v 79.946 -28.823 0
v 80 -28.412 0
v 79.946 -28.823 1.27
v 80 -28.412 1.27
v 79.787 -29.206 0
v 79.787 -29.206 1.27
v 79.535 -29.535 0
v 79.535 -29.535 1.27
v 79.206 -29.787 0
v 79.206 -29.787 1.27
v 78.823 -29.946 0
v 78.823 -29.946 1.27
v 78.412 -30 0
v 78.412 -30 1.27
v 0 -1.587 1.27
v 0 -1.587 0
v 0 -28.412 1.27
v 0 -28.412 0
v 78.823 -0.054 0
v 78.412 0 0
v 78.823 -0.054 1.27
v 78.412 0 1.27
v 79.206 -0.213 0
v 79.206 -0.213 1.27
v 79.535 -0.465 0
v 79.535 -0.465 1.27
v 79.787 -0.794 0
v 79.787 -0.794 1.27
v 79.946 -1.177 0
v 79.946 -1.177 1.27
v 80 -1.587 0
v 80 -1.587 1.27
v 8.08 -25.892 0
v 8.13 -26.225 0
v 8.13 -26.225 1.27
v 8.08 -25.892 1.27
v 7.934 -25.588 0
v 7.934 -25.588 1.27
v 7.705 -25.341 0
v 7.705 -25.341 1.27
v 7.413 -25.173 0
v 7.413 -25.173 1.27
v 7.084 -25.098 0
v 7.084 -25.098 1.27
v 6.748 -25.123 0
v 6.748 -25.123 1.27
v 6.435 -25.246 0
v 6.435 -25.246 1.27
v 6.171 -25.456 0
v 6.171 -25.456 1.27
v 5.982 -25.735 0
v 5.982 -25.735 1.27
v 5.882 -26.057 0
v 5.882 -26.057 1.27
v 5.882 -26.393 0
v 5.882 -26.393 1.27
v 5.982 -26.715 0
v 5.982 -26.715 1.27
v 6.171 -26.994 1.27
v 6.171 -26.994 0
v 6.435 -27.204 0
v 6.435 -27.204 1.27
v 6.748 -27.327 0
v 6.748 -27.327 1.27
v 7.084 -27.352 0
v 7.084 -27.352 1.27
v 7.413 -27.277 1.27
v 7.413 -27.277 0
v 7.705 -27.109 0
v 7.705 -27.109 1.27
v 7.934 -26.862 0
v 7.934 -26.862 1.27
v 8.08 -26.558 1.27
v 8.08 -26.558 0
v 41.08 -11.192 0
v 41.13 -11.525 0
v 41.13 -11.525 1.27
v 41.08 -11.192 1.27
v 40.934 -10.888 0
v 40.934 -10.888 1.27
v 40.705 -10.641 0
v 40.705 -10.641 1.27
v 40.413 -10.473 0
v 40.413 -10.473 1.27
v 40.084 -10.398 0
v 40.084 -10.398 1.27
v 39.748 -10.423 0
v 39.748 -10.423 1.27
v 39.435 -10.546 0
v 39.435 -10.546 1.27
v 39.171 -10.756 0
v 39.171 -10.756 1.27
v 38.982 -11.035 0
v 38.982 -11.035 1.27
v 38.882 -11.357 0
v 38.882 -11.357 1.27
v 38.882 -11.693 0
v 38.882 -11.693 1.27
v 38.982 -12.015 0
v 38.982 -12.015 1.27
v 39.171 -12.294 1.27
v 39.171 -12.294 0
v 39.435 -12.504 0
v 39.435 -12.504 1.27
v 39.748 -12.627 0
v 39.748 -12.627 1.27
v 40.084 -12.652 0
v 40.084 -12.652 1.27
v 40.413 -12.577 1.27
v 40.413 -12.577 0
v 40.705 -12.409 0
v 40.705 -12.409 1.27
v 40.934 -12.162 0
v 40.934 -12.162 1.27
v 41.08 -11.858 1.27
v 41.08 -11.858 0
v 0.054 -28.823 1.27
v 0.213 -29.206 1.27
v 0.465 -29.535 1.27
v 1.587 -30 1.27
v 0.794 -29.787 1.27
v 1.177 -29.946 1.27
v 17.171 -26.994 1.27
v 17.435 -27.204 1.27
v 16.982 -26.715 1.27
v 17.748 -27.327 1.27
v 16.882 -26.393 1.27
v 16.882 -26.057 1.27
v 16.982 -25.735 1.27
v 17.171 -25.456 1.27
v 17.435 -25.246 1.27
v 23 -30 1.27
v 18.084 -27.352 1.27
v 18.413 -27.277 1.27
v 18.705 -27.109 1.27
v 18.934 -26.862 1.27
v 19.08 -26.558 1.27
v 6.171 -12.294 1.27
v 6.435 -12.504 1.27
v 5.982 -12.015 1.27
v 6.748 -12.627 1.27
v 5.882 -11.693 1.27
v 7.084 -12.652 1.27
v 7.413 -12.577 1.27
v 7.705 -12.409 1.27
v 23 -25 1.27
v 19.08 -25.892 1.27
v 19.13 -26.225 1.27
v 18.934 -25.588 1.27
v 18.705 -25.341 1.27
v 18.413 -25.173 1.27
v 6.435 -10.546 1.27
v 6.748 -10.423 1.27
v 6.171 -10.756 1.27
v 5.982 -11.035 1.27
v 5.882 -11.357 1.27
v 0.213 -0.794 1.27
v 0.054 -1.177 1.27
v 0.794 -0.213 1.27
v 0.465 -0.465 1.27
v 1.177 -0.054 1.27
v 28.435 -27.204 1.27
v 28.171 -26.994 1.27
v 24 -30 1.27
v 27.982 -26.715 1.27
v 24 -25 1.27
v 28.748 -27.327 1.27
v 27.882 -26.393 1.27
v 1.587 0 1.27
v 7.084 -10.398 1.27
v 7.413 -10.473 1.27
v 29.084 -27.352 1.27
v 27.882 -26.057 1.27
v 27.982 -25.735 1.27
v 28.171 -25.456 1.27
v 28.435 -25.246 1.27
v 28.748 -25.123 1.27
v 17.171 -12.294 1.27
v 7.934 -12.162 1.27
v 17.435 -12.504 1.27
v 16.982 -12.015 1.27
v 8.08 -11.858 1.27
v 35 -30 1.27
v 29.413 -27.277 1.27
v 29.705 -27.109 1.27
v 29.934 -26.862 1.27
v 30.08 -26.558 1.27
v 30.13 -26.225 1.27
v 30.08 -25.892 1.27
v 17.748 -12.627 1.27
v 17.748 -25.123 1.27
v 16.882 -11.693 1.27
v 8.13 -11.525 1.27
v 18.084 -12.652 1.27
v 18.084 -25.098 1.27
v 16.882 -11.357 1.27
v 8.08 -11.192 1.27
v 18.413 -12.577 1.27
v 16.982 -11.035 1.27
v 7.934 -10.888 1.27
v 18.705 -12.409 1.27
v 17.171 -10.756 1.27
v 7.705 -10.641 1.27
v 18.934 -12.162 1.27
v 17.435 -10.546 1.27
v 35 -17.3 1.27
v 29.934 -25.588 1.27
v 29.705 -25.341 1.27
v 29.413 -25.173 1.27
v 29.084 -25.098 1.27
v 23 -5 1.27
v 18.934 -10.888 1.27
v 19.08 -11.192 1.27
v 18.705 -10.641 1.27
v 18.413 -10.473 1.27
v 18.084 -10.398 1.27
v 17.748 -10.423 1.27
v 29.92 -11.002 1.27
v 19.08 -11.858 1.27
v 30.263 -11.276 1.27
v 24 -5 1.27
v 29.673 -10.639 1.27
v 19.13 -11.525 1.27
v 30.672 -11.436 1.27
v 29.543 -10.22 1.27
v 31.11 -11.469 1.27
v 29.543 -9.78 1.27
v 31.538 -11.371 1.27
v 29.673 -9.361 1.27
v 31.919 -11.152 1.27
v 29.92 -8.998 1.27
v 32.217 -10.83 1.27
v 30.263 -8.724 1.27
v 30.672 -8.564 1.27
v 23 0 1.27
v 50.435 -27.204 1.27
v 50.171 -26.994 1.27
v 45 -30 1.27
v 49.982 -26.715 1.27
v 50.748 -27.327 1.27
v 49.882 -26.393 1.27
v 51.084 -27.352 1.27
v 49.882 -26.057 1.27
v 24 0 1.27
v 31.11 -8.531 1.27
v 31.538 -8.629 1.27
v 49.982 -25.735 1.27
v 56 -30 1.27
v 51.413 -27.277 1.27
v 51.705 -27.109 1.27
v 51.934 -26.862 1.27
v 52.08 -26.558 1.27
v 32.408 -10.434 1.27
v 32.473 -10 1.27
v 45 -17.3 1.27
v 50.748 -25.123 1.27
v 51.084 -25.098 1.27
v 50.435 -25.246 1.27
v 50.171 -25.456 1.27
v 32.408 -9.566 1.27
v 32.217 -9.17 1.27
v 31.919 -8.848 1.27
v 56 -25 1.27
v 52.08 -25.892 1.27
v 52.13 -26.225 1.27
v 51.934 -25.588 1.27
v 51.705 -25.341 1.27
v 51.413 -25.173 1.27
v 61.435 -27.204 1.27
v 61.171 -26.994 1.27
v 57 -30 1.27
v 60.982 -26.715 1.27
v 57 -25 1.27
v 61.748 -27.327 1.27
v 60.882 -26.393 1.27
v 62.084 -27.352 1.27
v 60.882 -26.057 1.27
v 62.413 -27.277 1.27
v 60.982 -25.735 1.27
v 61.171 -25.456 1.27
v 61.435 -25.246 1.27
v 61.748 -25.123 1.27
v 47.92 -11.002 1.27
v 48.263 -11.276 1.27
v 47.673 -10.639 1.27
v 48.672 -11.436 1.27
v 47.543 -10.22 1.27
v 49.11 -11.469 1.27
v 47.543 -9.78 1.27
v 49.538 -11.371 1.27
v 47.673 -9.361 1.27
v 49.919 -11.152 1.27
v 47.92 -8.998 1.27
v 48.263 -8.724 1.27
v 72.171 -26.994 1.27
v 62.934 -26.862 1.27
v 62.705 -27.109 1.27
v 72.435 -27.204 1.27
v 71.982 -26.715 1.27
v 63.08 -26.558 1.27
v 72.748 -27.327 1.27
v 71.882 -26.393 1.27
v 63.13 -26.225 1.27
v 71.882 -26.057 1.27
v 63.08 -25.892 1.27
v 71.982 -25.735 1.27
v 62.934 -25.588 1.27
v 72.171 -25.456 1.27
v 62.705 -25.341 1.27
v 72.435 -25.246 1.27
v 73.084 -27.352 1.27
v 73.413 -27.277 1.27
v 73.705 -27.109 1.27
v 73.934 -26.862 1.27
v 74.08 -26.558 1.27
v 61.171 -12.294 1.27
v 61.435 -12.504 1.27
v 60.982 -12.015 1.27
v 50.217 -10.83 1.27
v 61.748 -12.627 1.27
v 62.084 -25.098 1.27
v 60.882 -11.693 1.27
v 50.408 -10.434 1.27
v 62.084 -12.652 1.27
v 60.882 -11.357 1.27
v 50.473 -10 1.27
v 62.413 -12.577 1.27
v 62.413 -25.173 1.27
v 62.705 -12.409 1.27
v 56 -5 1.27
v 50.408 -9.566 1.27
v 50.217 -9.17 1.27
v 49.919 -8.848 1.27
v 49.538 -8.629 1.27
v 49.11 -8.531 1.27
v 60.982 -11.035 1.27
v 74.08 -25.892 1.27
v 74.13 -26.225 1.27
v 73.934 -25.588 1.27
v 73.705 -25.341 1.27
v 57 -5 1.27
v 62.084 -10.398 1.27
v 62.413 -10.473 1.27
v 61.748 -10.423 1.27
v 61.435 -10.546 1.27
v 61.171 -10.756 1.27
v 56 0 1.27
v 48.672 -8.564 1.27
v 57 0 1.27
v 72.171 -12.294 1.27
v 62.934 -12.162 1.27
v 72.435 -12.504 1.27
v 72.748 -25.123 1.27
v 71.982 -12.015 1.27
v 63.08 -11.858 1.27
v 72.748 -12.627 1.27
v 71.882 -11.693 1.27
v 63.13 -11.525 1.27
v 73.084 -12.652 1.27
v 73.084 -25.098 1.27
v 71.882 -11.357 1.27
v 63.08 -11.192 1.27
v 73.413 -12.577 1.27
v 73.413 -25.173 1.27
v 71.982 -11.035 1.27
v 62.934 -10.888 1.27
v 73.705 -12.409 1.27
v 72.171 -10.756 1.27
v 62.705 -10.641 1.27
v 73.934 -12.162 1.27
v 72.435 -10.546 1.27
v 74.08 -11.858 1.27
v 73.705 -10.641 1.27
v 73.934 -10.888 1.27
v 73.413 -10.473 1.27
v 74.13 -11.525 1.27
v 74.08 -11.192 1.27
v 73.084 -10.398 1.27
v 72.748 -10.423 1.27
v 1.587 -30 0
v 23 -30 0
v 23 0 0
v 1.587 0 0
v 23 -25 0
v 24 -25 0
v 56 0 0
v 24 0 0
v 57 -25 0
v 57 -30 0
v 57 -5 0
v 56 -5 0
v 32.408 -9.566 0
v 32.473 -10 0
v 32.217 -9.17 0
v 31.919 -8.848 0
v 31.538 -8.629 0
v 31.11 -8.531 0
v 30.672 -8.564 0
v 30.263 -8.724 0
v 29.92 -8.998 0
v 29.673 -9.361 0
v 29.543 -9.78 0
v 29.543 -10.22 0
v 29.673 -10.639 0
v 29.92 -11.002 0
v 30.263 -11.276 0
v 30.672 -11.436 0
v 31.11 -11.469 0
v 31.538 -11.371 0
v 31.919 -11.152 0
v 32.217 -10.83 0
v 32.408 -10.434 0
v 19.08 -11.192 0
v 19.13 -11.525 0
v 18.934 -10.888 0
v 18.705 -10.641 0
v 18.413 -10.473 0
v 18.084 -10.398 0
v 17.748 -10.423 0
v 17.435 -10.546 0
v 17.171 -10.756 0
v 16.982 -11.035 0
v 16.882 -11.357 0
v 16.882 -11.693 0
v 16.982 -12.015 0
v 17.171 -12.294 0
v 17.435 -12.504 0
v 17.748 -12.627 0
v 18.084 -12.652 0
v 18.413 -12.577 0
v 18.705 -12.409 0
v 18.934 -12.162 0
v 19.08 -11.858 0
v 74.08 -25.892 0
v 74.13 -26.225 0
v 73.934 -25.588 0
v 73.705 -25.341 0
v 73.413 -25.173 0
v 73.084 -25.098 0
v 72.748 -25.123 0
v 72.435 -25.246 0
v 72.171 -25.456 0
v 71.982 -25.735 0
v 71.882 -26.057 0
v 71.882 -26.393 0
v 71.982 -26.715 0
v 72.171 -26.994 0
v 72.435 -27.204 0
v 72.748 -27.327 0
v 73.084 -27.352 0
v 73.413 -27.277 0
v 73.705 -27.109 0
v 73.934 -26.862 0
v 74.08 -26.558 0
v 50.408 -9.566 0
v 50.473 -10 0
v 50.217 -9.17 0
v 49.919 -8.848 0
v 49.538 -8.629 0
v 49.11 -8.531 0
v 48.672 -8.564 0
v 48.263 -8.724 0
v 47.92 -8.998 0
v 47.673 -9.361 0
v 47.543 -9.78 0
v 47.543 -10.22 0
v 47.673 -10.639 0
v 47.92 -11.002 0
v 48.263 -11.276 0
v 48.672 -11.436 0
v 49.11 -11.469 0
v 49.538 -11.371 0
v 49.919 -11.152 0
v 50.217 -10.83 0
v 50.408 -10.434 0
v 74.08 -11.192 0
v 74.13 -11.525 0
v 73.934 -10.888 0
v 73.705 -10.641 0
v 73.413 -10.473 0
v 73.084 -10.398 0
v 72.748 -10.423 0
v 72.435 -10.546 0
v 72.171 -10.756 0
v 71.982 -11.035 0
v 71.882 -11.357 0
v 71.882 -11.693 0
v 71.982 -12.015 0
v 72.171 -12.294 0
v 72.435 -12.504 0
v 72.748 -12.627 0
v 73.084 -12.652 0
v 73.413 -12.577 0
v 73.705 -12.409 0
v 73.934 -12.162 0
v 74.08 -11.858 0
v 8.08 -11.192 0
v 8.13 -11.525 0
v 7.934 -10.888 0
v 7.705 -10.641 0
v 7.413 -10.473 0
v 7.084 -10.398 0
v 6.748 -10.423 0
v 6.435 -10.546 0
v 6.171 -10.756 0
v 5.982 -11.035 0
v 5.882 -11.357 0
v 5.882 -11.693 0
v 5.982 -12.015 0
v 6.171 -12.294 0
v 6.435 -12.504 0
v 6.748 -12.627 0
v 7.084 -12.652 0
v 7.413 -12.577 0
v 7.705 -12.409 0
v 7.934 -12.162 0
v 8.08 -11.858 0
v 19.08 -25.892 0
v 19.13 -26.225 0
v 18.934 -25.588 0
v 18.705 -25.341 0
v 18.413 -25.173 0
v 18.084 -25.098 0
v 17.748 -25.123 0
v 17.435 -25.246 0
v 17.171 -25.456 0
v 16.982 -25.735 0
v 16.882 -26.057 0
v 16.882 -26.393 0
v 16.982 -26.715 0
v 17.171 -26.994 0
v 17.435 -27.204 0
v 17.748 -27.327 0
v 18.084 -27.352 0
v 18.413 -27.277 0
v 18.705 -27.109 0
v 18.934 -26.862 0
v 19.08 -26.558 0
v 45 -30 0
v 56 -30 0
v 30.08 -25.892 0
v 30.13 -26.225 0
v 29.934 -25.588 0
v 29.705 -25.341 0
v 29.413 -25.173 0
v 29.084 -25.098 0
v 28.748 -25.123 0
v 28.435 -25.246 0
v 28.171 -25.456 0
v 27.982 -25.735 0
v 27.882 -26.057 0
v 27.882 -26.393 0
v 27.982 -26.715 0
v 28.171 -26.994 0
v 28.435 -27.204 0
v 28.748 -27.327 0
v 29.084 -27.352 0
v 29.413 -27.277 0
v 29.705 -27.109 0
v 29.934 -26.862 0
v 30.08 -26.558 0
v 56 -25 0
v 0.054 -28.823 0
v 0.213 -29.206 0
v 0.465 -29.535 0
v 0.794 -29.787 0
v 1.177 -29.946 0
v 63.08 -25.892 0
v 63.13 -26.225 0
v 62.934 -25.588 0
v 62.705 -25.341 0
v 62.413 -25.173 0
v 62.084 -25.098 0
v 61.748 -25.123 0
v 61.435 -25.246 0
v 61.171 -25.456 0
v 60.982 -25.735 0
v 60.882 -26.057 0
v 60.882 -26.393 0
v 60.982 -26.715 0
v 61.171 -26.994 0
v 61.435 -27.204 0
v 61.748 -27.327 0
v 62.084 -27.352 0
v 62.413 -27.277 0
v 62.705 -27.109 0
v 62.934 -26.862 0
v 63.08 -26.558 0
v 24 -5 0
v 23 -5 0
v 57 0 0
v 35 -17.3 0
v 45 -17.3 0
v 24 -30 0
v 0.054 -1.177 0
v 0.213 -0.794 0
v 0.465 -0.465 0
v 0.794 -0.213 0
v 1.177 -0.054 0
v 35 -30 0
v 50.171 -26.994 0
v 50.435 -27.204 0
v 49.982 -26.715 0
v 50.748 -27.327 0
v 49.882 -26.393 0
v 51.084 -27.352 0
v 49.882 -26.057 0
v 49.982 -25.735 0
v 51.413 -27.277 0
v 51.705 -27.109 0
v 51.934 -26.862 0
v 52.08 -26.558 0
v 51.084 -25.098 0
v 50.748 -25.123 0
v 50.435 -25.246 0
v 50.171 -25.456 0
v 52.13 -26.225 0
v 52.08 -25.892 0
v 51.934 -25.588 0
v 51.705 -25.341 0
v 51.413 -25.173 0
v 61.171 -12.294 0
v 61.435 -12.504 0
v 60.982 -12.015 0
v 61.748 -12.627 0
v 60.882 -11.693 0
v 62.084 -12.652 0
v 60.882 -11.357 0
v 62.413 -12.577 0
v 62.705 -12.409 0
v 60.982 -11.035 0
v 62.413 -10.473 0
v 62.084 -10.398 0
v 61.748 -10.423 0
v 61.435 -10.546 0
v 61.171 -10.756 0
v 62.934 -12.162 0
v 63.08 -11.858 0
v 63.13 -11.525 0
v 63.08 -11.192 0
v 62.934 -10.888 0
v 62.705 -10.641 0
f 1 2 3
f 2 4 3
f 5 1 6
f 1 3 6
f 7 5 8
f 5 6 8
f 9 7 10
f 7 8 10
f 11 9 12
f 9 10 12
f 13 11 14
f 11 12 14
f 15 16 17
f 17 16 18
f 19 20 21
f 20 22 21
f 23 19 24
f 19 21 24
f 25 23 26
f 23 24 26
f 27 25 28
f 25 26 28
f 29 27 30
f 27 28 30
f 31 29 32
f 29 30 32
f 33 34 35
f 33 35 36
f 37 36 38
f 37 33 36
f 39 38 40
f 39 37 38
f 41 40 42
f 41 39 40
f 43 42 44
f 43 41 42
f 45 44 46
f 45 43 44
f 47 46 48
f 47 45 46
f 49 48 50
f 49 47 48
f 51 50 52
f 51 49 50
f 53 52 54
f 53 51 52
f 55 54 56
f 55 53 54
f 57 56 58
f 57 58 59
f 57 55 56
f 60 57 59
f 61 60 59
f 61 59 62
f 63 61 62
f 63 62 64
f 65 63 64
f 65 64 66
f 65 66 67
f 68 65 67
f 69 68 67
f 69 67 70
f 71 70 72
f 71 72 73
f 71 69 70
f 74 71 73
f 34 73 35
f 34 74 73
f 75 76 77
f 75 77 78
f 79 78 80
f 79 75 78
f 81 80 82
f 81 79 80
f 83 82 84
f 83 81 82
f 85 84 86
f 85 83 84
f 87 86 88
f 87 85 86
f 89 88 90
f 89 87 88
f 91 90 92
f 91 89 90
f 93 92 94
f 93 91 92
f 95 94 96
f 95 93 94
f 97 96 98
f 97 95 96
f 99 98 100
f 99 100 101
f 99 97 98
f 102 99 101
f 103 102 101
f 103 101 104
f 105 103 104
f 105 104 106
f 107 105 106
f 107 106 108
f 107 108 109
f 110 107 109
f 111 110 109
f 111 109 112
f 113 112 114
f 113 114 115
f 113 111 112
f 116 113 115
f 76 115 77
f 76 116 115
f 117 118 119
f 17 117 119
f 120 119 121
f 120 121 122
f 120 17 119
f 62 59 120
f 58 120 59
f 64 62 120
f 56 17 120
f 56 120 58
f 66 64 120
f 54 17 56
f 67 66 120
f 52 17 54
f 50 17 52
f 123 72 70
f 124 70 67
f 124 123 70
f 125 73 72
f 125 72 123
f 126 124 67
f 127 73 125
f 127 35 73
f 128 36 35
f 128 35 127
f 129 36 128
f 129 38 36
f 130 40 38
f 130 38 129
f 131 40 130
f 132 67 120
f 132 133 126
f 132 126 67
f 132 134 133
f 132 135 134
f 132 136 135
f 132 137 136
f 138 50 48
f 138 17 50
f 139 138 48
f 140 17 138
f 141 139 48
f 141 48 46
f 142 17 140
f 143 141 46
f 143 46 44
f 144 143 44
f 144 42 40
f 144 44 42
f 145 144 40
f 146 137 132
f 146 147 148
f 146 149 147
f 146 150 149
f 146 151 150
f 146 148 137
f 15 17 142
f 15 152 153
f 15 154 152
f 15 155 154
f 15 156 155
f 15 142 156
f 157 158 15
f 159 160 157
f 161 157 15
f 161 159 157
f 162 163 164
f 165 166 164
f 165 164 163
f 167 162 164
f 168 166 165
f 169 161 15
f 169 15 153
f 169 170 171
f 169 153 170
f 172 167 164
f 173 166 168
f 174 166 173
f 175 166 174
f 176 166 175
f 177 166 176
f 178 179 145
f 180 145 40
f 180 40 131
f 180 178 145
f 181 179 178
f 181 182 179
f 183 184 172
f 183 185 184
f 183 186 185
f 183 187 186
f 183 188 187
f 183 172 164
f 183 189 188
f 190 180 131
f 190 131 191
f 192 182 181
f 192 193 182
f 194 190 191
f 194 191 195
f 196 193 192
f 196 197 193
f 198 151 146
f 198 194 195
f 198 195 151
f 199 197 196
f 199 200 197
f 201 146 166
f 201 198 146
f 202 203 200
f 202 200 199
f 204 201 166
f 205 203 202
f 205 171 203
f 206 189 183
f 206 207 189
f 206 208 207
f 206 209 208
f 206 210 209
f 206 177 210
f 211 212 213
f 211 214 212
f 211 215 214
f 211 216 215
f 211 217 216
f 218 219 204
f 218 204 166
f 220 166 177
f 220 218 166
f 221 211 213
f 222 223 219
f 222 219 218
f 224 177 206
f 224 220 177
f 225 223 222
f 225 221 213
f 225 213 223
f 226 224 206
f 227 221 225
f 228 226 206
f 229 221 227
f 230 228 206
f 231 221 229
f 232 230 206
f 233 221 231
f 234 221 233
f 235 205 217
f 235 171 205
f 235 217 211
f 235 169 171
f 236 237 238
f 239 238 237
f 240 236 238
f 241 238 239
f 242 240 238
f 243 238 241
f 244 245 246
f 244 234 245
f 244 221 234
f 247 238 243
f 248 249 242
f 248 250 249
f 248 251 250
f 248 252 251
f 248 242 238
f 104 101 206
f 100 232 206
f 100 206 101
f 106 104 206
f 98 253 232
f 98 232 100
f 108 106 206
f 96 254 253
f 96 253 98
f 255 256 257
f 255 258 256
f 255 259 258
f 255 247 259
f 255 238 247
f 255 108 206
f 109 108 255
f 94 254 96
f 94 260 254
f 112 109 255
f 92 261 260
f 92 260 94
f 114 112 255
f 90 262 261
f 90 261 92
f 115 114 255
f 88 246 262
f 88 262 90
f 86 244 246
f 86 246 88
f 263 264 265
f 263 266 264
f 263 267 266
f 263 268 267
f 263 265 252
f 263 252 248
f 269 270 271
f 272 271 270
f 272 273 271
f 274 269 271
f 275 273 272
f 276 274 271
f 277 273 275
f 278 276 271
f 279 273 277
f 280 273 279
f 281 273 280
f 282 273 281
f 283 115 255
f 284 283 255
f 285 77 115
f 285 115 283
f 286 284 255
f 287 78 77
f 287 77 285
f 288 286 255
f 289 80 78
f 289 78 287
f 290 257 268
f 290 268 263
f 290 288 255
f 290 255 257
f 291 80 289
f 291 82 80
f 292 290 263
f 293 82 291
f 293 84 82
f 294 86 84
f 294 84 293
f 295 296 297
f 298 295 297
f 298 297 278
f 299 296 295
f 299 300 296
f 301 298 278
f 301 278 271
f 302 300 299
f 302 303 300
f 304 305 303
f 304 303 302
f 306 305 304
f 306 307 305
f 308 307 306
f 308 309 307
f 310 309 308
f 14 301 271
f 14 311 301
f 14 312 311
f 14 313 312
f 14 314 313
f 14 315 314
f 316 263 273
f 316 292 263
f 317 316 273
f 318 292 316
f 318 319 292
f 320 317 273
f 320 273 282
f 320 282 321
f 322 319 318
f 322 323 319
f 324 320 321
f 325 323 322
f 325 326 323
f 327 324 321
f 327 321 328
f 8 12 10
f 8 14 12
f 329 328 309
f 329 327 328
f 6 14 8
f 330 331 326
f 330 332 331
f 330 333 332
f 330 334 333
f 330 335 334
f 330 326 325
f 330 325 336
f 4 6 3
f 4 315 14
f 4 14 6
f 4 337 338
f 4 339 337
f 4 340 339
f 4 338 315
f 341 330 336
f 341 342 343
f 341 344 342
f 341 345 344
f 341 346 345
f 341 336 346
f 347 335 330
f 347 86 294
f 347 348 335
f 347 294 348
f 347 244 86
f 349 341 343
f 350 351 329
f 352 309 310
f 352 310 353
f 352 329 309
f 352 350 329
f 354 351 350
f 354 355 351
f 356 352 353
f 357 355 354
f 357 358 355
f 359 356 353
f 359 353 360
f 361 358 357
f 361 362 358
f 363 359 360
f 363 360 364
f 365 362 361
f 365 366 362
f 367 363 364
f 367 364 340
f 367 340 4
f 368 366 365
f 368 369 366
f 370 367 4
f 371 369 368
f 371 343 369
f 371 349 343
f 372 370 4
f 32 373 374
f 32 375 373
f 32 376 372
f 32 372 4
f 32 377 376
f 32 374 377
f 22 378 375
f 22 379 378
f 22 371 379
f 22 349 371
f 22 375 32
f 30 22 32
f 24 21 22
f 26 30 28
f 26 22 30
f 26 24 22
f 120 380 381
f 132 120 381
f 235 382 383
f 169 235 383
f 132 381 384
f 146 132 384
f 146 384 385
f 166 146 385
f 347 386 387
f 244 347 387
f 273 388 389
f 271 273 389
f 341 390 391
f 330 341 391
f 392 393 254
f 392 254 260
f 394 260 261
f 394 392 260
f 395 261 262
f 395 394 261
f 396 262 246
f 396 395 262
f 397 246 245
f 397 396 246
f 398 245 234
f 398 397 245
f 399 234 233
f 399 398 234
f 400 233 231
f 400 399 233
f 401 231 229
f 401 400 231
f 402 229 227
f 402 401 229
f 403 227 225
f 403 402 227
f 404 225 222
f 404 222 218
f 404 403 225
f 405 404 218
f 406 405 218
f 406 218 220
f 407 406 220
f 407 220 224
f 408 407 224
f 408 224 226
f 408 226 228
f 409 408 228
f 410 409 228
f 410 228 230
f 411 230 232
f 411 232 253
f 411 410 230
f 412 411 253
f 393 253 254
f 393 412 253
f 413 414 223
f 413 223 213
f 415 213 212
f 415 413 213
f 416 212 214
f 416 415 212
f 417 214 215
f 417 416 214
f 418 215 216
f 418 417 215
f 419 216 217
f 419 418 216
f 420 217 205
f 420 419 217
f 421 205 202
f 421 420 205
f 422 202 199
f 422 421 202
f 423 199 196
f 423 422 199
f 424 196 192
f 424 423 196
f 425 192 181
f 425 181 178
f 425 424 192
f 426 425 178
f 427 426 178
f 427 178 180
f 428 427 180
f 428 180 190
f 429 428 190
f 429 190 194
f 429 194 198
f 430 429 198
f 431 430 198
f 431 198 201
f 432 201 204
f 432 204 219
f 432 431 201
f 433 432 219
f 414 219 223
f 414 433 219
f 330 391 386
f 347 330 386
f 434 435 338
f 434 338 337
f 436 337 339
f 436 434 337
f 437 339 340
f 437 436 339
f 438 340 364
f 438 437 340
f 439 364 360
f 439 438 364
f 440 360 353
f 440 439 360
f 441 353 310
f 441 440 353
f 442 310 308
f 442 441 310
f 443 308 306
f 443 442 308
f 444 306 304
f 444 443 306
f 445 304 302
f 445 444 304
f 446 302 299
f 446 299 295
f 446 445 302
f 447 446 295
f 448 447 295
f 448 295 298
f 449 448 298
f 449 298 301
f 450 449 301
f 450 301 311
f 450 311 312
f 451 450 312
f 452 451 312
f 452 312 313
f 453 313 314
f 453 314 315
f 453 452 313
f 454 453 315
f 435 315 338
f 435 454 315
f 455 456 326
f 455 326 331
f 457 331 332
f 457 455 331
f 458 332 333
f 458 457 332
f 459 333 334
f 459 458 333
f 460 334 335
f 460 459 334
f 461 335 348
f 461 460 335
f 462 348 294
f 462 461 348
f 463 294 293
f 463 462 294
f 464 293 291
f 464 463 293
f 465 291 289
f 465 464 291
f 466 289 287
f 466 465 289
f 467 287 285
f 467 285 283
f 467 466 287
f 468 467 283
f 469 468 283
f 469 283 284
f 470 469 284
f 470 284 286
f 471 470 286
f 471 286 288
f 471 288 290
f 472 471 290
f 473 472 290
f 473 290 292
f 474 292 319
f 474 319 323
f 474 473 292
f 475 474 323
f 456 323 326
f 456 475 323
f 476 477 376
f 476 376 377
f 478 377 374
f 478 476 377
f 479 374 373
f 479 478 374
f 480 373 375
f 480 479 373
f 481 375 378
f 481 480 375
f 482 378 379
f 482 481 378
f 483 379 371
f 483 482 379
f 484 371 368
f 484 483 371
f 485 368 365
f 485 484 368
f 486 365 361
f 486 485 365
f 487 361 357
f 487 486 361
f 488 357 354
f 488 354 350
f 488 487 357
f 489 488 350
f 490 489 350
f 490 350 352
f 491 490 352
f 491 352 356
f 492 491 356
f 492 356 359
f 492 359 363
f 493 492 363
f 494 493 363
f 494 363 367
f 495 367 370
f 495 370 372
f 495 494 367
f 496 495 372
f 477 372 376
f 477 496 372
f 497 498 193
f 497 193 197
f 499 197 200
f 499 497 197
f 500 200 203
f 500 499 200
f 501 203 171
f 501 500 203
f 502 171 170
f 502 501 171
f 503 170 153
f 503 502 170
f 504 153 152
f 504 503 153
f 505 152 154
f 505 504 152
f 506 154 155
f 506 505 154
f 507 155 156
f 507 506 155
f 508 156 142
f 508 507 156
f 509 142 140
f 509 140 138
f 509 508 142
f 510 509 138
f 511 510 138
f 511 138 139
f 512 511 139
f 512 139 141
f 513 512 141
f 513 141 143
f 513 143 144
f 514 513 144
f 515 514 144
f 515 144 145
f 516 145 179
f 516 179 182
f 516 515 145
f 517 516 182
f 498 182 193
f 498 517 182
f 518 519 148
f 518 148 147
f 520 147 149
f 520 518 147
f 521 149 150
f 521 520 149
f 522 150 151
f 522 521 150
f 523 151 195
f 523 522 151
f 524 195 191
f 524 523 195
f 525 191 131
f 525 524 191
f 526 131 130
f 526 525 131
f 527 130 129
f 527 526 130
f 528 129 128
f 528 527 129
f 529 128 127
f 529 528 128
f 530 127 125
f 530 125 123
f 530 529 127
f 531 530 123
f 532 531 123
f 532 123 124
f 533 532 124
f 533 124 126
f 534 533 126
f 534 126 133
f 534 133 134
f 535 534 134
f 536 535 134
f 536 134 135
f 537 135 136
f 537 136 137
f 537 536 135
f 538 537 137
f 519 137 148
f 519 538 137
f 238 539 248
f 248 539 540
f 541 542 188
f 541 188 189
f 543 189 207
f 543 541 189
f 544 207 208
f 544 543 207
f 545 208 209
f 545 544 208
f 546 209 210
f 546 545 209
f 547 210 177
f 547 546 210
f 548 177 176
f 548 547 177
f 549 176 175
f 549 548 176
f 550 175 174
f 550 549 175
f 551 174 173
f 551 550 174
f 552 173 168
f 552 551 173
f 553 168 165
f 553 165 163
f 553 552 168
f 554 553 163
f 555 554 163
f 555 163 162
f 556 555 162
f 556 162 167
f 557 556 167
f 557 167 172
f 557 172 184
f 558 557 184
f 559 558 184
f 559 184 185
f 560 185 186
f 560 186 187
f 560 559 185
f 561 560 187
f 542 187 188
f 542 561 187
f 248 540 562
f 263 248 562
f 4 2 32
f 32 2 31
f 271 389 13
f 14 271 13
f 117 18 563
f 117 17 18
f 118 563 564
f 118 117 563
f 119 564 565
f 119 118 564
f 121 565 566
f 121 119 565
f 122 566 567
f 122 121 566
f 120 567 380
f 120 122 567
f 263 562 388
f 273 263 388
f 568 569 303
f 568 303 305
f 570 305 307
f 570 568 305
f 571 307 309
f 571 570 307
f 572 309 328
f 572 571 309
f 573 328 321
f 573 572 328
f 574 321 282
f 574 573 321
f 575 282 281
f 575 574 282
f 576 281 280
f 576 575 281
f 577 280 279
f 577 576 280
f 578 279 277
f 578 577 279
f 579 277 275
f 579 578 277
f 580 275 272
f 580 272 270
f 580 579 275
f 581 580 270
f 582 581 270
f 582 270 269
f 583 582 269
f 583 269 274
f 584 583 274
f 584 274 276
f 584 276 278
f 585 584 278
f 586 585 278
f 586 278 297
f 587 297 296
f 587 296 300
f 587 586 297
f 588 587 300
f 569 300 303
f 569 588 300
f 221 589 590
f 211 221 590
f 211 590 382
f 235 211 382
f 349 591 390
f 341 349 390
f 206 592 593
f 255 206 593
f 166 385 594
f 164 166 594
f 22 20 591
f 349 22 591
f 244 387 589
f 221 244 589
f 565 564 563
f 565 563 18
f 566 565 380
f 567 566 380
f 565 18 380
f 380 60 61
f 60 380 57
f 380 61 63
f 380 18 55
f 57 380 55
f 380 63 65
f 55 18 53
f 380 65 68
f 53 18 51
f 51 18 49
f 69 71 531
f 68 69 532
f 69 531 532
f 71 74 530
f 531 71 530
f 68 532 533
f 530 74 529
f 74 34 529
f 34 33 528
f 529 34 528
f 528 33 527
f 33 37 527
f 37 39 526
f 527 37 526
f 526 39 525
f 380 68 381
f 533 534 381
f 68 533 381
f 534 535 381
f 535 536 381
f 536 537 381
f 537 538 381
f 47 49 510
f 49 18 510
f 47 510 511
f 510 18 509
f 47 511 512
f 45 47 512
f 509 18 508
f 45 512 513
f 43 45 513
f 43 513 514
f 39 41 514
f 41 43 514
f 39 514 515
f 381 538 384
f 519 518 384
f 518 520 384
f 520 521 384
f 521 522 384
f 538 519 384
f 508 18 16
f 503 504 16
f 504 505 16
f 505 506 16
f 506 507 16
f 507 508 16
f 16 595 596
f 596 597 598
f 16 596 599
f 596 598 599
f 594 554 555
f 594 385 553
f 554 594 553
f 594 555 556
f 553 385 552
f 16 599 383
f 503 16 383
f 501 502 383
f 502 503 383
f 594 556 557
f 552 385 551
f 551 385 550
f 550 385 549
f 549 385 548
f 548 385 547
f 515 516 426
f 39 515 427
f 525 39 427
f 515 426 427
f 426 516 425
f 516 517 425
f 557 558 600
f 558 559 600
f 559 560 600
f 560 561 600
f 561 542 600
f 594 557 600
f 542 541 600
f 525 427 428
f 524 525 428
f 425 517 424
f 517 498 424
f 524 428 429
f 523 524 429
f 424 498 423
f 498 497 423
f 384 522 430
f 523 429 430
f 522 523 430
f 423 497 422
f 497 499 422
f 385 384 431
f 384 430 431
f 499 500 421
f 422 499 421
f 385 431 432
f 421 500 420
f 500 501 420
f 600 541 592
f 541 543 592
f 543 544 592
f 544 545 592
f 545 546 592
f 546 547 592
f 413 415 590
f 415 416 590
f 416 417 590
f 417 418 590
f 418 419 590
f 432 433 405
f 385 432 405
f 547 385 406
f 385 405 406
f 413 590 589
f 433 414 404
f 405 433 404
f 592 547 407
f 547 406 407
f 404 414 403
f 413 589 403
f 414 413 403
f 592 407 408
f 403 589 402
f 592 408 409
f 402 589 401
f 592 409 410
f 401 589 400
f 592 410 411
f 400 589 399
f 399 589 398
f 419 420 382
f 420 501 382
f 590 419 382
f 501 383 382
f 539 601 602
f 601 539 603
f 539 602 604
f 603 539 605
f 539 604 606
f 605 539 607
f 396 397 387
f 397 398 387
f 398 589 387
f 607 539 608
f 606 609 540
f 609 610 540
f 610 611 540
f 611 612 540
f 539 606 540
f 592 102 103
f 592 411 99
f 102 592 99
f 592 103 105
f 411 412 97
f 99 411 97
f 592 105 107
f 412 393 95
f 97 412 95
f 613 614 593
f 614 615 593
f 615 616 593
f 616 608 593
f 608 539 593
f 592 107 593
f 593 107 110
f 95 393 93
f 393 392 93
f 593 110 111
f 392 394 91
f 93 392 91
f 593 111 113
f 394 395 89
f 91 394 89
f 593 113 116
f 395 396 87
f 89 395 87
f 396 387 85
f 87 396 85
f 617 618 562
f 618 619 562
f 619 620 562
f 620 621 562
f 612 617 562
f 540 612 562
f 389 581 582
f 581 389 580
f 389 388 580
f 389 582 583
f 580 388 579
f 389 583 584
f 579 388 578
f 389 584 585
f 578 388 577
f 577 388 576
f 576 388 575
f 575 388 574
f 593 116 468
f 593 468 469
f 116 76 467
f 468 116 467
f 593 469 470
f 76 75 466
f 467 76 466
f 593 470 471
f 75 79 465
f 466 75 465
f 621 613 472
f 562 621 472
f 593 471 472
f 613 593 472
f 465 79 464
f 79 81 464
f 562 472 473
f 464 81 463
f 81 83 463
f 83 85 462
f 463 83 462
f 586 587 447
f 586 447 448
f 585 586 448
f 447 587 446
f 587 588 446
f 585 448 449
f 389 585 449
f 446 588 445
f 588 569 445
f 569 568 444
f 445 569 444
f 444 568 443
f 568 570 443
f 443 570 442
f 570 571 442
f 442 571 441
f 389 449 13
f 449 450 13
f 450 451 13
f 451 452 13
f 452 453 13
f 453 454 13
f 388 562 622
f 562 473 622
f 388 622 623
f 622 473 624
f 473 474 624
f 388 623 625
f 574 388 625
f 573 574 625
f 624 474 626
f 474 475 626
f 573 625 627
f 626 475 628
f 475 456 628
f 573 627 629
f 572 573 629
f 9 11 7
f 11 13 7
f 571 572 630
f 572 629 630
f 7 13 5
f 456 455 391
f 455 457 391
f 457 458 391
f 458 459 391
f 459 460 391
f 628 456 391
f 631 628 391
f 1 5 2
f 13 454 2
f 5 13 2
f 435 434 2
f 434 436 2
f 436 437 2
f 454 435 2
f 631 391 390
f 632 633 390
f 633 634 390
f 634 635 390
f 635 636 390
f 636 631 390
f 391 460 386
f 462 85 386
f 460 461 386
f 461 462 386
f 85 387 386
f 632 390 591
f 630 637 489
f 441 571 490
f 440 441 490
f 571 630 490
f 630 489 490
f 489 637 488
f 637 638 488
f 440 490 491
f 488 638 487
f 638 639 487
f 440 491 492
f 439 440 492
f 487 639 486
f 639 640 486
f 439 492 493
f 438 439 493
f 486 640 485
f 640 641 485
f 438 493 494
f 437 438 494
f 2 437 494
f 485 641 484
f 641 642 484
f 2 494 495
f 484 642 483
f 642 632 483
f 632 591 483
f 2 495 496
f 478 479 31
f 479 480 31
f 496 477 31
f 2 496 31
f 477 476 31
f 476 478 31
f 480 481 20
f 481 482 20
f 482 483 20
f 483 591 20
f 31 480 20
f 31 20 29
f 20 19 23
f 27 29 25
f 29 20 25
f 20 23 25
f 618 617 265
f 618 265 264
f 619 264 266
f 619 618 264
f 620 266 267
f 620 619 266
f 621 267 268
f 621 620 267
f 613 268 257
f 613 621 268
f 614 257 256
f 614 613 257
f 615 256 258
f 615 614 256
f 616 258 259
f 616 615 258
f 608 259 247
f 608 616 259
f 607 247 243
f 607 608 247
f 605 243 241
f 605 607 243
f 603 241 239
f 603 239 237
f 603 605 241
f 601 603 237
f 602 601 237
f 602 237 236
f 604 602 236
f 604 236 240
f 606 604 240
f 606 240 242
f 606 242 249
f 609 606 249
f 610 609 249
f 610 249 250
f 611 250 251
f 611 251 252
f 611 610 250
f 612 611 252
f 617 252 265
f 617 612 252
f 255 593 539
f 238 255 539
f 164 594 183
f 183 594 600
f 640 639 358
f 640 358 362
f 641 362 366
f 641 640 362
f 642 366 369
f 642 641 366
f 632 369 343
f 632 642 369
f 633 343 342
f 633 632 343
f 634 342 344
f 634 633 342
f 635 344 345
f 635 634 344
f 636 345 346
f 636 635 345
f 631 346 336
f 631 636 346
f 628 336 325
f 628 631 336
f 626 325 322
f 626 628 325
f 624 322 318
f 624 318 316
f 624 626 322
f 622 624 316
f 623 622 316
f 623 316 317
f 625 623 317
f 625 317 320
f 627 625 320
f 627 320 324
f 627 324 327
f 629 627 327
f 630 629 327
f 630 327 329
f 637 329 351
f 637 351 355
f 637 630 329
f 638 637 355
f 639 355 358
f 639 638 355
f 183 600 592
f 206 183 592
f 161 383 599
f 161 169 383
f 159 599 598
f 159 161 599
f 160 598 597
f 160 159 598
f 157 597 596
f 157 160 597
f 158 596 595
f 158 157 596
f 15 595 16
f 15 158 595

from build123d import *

# Parameters (mm, degrees)
SKETCH1_R           = 1.1303
SKETCH1_R_2         = 1.4732
BOSS_EXTRUDE1_DEPTH = 1.27
FILLET1_R           = 1.5875


with BuildPart() as part:
    # Sketch1 → Boss-Extrude1 (new body)
    with BuildSketch(Plane.XY):
        Polygon((23, 0), (0, 0), (0, -30), (23, -30), (23, -25), (24, -25), (24, -30), (35, -30), (35, -17.3), (45, -17.3), (45, -30), (56, -30), (56, -25), (57, -25), (57, -30), (80, -30), (80, 0), (57, 0), (57, -5), (56, -5), (56, 0), (24, 0), (24, -5), (23, -5), align=None)
        with Locations((7, -26.225)):
            Circle(SKETCH1_R, mode=Mode.SUBTRACT)
        with Locations((18, -26.225)):
            Circle(SKETCH1_R, mode=Mode.SUBTRACT)
        with Locations((29, -26.225)):
            Circle(SKETCH1_R, mode=Mode.SUBTRACT)
        with Locations((51, -26.225)):
            Circle(SKETCH1_R, mode=Mode.SUBTRACT)
        with Locations((62, -26.225)):
            Circle(SKETCH1_R, mode=Mode.SUBTRACT)
        with Locations((73, -26.225)):
            Circle(SKETCH1_R, mode=Mode.SUBTRACT)
        with Locations((7, -11.525)):
            Circle(SKETCH1_R, mode=Mode.SUBTRACT)
        with Locations((18, -11.525)):
            Circle(SKETCH1_R, mode=Mode.SUBTRACT)
        with Locations((31, -10)):
            Circle(SKETCH1_R_2, mode=Mode.SUBTRACT)
        with Locations((40, -11.525)):
            Circle(SKETCH1_R, mode=Mode.SUBTRACT)
        with Locations((49, -10)):
            Circle(SKETCH1_R_2, mode=Mode.SUBTRACT)
        with Locations((62, -11.525)):
            Circle(SKETCH1_R, mode=Mode.SUBTRACT)
        with Locations((73, -11.525)):
            Circle(SKETCH1_R, mode=Mode.SUBTRACT)
    extrude(amount=BOSS_EXTRUDE1_DEPTH)

    # Fillet1
    fillet1_edges = [part.edges().sort_by_distance(p)[0] for p in [
        (0, -30, 0.635),
        (0, 0, 0.635),
        (80, 0, 0.635),
        (80, -30, 0.635),
    ]]
    fillet(fillet1_edges, radius=FILLET1_R)


solid = part.part
